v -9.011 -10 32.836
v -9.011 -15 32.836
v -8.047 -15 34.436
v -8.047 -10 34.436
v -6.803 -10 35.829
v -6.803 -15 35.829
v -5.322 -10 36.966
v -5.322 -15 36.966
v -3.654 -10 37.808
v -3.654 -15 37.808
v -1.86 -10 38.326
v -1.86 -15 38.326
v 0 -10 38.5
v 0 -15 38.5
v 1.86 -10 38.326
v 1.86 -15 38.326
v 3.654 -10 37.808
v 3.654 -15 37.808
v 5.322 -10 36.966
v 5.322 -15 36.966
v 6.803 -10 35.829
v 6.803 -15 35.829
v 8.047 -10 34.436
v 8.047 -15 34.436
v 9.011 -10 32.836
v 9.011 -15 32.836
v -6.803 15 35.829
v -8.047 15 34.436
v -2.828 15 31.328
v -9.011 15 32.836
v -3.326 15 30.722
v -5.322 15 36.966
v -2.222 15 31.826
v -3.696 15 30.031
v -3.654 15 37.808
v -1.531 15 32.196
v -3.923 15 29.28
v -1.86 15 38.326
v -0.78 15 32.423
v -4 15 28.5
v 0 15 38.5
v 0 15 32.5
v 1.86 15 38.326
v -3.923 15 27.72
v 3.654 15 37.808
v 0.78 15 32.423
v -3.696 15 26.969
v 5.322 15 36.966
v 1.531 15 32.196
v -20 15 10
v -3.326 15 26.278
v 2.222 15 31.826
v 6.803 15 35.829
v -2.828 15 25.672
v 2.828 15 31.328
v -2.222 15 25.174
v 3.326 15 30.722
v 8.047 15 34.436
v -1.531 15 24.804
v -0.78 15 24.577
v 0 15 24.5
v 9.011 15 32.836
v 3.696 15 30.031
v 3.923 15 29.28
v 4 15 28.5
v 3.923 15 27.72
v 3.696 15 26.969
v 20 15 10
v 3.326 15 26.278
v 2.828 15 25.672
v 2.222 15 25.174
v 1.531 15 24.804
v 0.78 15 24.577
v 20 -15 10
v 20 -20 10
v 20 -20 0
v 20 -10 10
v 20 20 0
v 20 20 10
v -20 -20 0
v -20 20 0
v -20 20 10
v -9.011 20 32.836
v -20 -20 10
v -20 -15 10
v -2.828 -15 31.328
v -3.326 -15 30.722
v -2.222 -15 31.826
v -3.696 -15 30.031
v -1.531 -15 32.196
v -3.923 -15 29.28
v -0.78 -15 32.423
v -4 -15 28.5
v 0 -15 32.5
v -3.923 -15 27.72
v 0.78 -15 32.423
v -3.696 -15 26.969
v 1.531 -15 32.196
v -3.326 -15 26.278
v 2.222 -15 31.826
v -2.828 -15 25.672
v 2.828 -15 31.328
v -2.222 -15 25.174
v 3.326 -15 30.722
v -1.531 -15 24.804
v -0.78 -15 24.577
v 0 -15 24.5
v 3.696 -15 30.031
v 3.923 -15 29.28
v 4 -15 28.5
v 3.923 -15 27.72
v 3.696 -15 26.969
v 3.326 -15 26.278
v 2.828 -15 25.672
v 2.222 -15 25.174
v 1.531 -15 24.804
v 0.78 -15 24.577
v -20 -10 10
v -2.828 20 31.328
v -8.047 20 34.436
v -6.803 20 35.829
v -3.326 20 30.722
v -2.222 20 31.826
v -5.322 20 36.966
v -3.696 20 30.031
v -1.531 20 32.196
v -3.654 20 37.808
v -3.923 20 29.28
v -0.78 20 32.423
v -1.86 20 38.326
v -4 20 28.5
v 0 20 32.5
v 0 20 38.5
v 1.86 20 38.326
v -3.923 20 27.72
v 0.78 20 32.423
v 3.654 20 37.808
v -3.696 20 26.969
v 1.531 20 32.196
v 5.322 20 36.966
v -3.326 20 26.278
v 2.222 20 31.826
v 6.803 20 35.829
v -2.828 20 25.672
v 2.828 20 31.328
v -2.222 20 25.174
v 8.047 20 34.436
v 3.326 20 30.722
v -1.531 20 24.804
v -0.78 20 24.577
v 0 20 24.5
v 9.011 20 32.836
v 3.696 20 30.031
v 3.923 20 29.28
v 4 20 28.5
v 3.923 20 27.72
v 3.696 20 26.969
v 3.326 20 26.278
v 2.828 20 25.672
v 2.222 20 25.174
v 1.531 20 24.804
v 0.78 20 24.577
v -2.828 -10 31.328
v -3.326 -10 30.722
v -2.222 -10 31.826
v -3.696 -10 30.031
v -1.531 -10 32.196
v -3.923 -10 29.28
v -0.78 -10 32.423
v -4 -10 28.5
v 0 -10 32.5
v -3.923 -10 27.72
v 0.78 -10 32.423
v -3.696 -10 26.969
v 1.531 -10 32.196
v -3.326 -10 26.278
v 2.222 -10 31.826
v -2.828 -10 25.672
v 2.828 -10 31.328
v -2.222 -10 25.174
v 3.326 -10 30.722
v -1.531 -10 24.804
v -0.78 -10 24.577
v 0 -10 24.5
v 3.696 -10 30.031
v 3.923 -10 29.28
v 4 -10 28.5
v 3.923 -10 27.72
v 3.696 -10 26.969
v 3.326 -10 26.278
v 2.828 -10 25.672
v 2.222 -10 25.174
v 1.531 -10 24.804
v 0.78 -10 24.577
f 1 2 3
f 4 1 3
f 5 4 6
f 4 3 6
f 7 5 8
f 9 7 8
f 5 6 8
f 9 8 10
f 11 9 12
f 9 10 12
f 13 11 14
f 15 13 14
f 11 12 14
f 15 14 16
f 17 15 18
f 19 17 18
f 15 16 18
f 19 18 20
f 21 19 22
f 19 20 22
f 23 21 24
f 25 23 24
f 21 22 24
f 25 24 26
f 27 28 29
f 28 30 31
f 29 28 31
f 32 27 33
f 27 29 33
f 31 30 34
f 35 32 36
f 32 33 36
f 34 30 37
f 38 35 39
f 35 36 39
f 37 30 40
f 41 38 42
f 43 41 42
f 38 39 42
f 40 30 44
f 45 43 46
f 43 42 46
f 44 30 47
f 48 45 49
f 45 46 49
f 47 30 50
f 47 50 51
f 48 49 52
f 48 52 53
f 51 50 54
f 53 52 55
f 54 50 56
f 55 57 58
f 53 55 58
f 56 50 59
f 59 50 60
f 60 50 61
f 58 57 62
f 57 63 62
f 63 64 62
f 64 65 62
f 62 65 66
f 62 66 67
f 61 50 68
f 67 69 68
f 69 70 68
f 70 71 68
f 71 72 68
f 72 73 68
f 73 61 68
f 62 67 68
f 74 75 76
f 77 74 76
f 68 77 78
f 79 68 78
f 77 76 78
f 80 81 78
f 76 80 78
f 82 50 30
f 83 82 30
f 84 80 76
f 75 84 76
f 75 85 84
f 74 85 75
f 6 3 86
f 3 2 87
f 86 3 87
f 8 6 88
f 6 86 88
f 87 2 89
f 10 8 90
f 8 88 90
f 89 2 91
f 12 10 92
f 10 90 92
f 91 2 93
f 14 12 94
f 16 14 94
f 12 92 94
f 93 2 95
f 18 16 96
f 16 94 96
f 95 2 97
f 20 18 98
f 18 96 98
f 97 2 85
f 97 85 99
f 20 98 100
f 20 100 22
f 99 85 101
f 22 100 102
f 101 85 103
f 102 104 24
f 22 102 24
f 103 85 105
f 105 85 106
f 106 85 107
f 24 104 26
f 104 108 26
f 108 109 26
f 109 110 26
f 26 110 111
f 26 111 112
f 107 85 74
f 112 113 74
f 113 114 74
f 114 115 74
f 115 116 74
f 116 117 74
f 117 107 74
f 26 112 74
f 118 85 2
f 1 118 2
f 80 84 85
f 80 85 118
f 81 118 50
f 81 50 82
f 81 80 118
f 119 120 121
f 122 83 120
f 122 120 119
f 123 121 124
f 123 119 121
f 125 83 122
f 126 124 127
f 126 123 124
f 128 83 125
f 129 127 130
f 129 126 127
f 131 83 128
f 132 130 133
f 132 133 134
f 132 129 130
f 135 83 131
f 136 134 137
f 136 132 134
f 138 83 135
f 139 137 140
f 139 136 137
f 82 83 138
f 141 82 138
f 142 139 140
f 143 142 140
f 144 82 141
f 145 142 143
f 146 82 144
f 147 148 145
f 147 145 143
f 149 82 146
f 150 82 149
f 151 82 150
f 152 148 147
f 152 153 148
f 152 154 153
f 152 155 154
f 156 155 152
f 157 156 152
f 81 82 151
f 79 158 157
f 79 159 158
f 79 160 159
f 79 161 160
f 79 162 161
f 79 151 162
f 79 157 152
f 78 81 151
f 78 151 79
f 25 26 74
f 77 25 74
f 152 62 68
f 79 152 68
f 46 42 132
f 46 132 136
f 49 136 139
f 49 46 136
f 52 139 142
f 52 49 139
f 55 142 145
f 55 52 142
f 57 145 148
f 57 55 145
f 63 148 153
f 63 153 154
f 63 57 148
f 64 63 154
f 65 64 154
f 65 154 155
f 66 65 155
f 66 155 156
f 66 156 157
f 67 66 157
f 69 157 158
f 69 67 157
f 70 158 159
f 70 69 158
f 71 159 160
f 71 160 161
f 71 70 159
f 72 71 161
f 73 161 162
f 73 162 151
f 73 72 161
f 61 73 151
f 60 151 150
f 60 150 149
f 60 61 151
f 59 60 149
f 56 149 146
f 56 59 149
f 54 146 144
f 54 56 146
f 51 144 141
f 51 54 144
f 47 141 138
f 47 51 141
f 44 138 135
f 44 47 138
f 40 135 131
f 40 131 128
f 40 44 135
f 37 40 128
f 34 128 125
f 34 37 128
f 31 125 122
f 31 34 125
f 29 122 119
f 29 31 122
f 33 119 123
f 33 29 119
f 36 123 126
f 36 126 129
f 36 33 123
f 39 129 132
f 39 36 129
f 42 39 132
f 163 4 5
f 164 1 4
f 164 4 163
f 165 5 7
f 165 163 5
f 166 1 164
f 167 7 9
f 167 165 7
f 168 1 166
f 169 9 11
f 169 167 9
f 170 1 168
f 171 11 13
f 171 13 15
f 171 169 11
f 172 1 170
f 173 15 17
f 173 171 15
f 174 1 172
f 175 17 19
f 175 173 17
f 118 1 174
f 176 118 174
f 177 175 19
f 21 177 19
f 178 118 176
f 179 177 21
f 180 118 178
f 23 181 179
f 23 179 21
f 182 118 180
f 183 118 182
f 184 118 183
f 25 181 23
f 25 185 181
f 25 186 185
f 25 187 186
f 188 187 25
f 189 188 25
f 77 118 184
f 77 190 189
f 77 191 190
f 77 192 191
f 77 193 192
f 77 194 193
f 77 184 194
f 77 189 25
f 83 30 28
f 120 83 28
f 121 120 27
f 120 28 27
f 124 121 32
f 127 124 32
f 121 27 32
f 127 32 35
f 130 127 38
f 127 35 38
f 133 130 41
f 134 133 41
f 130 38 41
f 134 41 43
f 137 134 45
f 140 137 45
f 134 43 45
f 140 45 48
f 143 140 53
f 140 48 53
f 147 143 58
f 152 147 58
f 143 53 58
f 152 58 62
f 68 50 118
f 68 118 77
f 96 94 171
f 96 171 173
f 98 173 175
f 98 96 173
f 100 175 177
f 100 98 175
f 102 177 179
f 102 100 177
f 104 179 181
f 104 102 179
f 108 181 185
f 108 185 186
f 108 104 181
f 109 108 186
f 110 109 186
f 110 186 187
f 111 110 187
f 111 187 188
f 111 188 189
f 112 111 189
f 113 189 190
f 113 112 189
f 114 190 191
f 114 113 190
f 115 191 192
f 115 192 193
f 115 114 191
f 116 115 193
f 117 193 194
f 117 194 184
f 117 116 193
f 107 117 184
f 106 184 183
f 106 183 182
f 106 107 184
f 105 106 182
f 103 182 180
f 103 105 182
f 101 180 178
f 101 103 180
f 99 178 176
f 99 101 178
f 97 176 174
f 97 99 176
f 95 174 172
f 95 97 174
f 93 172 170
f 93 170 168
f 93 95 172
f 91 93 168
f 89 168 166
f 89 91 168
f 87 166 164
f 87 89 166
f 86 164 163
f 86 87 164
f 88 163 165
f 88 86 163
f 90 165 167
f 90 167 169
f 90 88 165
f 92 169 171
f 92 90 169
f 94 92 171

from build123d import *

# Parameters (mm, degrees)
SKETCH_1_W             = 40
SKETCH_1_H             = 40
EXTRUDE_1_DEPTH        = 10
SKETCH_2_R             = 10
SKETCH_2_R_2           = 4
EXTRUDE_2_DEPTH        = 5
PATTERN_LINEAR_1_COUNT = 2
PATTERN_LINEAR_1_PITCH = 30


with BuildPart() as part:
    # 草图1 → 凸台-拉伸1 (new body)
    with BuildSketch(Plane.XY):
        Rectangle(SKETCH_1_W, SKETCH_1_H)
    extrude(amount=EXTRUDE_1_DEPTH)

    # 草图2 → 凸台-拉伸2 (add)
    # profile 1 of 2: a face of its own
    with BuildSketch(Plane(origin=(0, 15, 0), x_dir=(1, 0, 0), z_dir=(0, 1, 0))):
        with BuildLine():
            Line((20, -10), (-20, -10))
            Line((-20, -10), (-9.01096744, -32.836181016))
            ThreePointArc((-9.01096744, -32.836181016), (-2.223772201, -18.750392972), (10, -28.5))
            ThreePointArc((10, -28.5), (9.749607028, -30.723772201), (9.01096744, -32.836181016))
            Line((9.01096744, -32.836181016), (20, -10))
        make_face()
    # profile 2 of 2: a face of its own
    with BuildSketch(Plane(origin=(0, 15, 0), x_dir=(1, 0, 0), z_dir=(0, 1, 0))):
        with Locations((0, -28.5)):
            Circle(SKETCH_2_R)
        with Locations(Location((0, -28.5, 0), (0, 0, 270))):
            Circle(SKETCH_2_R_2, mode=Mode.SUBTRACT)
    extrude_2 = extrude(amount=EXTRUDE_2_DEPTH)

    # 阵列(线性)1: 凸台-拉伸2 ×2
    with Locations(*[(0, -i * PATTERN_LINEAR_1_PITCH, 0) for i in range(1, PATTERN_LINEAR_1_COUNT)]):
        add(extrude_2)


solid = part.part
